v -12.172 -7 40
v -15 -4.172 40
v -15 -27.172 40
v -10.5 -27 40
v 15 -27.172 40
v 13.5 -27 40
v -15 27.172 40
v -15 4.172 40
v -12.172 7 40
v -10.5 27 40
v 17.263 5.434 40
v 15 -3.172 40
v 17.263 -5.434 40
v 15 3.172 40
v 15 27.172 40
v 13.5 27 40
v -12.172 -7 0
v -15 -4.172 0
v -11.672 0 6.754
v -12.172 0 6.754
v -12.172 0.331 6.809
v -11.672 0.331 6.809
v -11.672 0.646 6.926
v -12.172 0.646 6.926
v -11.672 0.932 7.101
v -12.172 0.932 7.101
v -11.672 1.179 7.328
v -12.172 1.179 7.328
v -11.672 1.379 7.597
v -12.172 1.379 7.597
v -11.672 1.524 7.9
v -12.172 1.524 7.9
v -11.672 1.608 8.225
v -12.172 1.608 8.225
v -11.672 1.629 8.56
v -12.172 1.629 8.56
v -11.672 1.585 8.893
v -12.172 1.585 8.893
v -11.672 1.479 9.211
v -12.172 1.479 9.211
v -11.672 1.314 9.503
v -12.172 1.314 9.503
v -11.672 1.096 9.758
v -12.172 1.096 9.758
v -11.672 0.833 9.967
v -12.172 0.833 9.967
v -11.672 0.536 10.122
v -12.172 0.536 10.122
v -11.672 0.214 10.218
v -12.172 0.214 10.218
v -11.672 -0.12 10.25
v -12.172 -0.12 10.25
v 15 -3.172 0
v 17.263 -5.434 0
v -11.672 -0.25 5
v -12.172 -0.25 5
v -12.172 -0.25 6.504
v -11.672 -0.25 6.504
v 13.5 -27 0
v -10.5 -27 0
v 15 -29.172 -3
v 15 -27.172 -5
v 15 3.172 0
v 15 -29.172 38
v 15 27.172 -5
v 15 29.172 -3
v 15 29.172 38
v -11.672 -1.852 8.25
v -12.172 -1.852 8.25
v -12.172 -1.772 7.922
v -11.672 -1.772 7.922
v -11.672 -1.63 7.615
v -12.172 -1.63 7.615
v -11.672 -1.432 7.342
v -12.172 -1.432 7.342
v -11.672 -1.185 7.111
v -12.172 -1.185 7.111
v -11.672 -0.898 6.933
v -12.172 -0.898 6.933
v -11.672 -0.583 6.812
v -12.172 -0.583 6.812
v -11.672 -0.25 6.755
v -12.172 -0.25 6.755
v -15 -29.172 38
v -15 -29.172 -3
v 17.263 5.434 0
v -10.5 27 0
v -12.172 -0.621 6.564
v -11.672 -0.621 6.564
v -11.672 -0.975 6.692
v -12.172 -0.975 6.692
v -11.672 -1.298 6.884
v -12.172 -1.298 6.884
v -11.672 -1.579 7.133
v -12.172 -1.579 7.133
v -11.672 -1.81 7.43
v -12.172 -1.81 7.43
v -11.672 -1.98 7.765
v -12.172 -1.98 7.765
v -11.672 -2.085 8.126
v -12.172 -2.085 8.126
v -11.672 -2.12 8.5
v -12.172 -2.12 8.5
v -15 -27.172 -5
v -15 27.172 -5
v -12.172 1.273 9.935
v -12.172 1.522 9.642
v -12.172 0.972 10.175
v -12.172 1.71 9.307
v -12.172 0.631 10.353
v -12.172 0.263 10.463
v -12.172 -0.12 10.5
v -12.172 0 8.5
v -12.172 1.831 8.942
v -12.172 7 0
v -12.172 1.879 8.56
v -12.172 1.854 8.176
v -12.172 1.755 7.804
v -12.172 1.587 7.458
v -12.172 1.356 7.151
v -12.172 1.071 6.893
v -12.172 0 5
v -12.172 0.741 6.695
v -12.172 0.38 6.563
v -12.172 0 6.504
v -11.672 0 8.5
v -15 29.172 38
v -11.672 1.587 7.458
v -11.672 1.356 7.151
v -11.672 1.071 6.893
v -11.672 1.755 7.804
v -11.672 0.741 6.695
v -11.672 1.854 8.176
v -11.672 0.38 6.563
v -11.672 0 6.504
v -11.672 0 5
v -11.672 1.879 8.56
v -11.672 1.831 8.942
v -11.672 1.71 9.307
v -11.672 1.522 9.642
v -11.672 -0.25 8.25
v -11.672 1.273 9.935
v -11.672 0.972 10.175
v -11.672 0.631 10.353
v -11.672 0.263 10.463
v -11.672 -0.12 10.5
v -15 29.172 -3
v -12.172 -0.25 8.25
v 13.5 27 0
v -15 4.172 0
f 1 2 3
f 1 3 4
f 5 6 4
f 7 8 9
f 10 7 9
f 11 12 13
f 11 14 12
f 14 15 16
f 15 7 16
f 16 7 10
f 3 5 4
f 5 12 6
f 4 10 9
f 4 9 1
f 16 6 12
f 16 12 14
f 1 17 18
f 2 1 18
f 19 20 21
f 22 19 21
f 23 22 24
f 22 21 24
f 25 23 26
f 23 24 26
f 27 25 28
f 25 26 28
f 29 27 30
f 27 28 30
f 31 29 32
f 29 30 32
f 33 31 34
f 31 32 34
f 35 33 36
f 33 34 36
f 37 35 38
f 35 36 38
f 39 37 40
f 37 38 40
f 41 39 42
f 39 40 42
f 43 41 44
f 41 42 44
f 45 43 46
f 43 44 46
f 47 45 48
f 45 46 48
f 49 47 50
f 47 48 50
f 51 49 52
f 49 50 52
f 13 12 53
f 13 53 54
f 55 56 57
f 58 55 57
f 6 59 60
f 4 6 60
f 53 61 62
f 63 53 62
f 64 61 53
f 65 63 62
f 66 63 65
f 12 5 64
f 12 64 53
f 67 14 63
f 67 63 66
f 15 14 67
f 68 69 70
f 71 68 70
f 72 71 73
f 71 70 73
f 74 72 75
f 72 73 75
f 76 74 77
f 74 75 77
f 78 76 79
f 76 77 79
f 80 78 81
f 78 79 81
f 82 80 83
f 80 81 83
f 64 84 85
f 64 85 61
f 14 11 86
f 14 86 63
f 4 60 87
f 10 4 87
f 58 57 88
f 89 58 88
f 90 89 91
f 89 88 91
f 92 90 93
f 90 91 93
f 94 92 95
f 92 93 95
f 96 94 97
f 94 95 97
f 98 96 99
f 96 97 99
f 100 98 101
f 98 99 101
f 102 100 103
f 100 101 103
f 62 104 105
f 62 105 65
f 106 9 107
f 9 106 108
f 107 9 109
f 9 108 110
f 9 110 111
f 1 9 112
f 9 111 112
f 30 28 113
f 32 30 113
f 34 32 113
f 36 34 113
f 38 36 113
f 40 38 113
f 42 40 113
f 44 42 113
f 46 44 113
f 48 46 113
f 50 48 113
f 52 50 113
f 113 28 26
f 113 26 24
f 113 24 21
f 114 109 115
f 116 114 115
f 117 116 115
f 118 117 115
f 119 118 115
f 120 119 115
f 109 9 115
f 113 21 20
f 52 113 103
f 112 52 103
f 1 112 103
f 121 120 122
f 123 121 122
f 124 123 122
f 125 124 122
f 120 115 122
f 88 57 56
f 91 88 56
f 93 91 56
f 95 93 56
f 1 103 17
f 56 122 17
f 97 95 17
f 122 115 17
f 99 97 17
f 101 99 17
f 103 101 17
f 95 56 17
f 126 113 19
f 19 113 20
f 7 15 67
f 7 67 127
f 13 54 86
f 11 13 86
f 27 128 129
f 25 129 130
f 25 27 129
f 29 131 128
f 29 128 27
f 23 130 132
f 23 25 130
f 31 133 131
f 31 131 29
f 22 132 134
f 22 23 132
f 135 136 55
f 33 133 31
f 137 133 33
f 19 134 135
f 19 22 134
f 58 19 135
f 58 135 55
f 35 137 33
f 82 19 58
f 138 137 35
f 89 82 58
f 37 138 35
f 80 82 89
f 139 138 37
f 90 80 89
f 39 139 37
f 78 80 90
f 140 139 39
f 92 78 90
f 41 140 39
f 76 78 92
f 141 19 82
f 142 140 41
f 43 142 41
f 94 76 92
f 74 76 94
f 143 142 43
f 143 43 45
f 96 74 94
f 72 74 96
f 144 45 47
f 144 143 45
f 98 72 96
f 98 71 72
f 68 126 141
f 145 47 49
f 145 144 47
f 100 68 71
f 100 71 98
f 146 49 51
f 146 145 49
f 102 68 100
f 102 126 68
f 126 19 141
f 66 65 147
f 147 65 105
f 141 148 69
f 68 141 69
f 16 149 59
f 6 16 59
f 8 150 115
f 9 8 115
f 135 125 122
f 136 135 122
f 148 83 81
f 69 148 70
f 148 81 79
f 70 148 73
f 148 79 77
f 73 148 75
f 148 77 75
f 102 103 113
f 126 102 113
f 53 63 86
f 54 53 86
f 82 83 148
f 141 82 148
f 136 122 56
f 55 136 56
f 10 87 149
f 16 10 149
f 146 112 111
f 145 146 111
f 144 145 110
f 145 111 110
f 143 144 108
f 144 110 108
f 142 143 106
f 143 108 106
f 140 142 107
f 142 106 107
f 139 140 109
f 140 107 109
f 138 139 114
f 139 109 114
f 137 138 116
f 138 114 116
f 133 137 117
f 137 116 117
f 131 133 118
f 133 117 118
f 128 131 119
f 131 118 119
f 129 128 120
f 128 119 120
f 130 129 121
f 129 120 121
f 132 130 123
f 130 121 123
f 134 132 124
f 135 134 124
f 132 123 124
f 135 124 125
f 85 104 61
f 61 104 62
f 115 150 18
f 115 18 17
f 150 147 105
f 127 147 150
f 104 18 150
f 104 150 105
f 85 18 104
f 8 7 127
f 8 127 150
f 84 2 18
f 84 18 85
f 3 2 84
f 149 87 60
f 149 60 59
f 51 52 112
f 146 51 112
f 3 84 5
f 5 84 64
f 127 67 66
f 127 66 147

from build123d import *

# Parameters (mm, degrees)
F1_DEPTH = 40
F0_W     = 0.5
F0_H     = 12
F0_W_2   = 11.5
F0_W_3   = 12
F0_H_2   = 0.5
F0_H_3   = 14.25
F2_DEPTH = 5
F3_SIZE  = 2
F5_DEPTH = 0.5


with BuildPart() as f1:
    # F0 (on Top) → F1 (new body)
    with BuildSketch(Plane.XY):
        Polygon((17.2627416998, 5.4343145751), (15, 3.1715728753), (15, -3.1715728753), (17.2627416998, -5.4343145751), (17.2627416998, -0.5656854249), (17.2627416998, 0.5656854249), align=None)
        Polygon((-15, 29.1715728753), (-15, 4.1715728753), (-12.1715728752, 7), (-12.1715728752, 0), (-12.1715728752, -7), (-15, -4.1715728753), (-15, -29.1715728753), (15, -29.1715728753), (15, -3.1715728753), (15, 3.1715728753), (15, 29.1715728753), align=None)
        Polygon((-10.4999961331, 14.999999851), (-10.4999961331, 26.999999851), (1.5000038669, 26.999999851), (2.0000038669, 26.999999851), (13.5000038669, 26.999999851), (13.5000038669, 14.999999851), (13.5000038669, 14.499999851), (13.5000038669, 0.249999851), (13.5000038669, -0.250000149), (13.5000038669, -14.500000149), (13.5000038669, -15.000000149), (13.5000038669, -27.000000149), (2.0000038669, -27.000000149), (1.5000038669, -27.000000149), (-10.4999961331, -27.000000149), (-10.4999961331, -15.000000149), (-10.4999961331, -14.500000149), (-10.4999961331, -0.250000149), (-10.4999961331, 0.249999851), (-10.4999961331, 14.499999851), align=None, mode=Mode.SUBTRACT)
    extrude(amount=F1_DEPTH)

    # F0 (on Top) → F2 (join)
    with BuildSketch(Plane.XY):
        Polygon((-15, 29.1715728753), (-15, 4.1715728753), (-12.1715728752, 7), (-12.1715728752, 0), (-12.1715728752, -7), (-15, -4.1715728753), (-15, -29.1715728753), (15, -29.1715728753), (15, -3.1715728753), (15, 3.1715728753), (15, 29.1715728753), align=None)
        Polygon((-10.4999961331, 14.999999851), (-10.4999961331, 26.999999851), (1.5000038669, 26.999999851), (2.0000038669, 26.999999851), (13.5000038669, 26.999999851), (13.5000038669, 14.999999851), (13.5000038669, 14.499999851), (13.5000038669, 0.249999851), (13.5000038669, -0.250000149), (13.5000038669, -14.500000149), (13.5000038669, -15.000000149), (13.5000038669, -27.000000149), (2.0000038669, -27.000000149), (1.5000038669, -27.000000149), (-10.4999961331, -27.000000149), (-10.4999961331, -15.000000149), (-10.4999961331, -14.500000149), (-10.4999961331, -0.250000149), (-10.4999961331, 0.249999851), (-10.4999961331, 14.499999851), align=None, mode=Mode.SUBTRACT)
        Polygon((-12.1715728752, 7), (-15, 4.1715728753), (-15, -4.1715728753), (-12.1715728752, -7), (-12.1715728752, 0), align=None)
        with Locations((1.7500038669, -21.000000149)):
            Rectangle(F0_W, F0_H)
        with Locations((7.7500038669, -21.000000149)):
            Rectangle(F0_W_2, F0_H)
        with Locations((-4.4999961331, -21.000000149)):
            Rectangle(F0_W_3, F0_H)
        with Locations((-4.4999961331, -14.750000149)):
            Rectangle(F0_W_3, F0_H_2)
        with Locations((1.7500038669, -14.750000149)):
            Rectangle(F0_W, F0_H_2)
        with Locations((1.7500038669, -7.375000149)):
            Rectangle(F0_W, F0_H_3)
        with Locations((-4.4999961331, -7.375000149)):
            Rectangle(F0_W_3, F0_H_3)
        with Locations((7.7500038669, -7.375000149)):
            Rectangle(F0_W_2, F0_H_3)
        with Locations((7.7500038669, 7.374999851)):
            Rectangle(F0_W_2, F0_H_3)
        with Locations((-4.4999961331, 7.374999851)):
            Rectangle(F0_W_3, F0_H_3)
        with Locations((1.7500038669, -1.49e-07)):
            Rectangle(F0_W, F0_H_2)
        with Locations((1.7500038669, 7.374999851)):
            Rectangle(F0_W, F0_H_3)
        with Locations((7.7500038669, 14.749999851)):
            Rectangle(F0_W_2, F0_H_2)
        with Locations((1.7500038669, 14.749999851)):
            Rectangle(F0_W, F0_H_2)
        with Locations((-4.4999961331, 14.749999851)):
            Rectangle(F0_W_3, F0_H_2)
        with Locations((-4.4999961331, 20.999999851)):
            Rectangle(F0_W_3, F0_H)
        with Locations((7.7500038669, 20.999999851)):
            Rectangle(F0_W_2, F0_H)
        with Locations((1.7500038669, 20.999999851)):
            Rectangle(F0_W, F0_H)
        with Locations((-4.4999961331, -1.49e-07)):
            Rectangle(F0_W_3, F0_H_2)
        with Locations((7.7500038669, -1.49e-07)):
            Rectangle(F0_W_2, F0_H_2)
        with Locations((7.7500038669, -14.750000149)):
            Rectangle(F0_W_2, F0_H_2)
    extrude(amount=-F2_DEPTH)

    # F3
    f3_edges = [f1.edges().sort_by_distance(p)[0] for p in [
        (0, -29.171573, -5),
        (0, 29.171573, -5),
        (0, -29.171573, 40),
        (0, 29.171573, 40),
    ]]
    chamfer(f3_edges, length=F3_SIZE)

    # F4 (on face) → F5 (cut)
    with BuildSketch(Plane(origin=(-12.1715728752, 0, 0), x_dir=(0, -1, 0), z_dir=(-1, 0, 0))):
        with BuildLine():
            Line((0.12, 10.25), (0.12, 10.5))
            ThreePointArc((0.12, 10.5), (-1.8790989856, 8.5600270426), (0, 6.5036032458))
            Line((0, 6.5036032458), (0, 6.7541191335))
            ThreePointArc((0, 6.7541191335), (-1.6289699135, 8.5600353381), (0.12, 10.25))
        make_face()
        with BuildLine():
            Line((0, 8.5), (0, 6.7541191335))
            ThreePointArc((0, 6.7541191335), (0.1250128042, 6.7500071795), (0.25, 6.7548352513))
            Line((0.25, 6.7548352513), (0.25, 8.25))
            Line((0.25, 8.25), (1.8520508076, 8.25))
            ThreePointArc((1.8520508076, 8.25), (1.865506934, 8.3746782406), (1.87, 8.5))
            Line((1.87, 8.5), (0, 8.5))
        make_face()
        with BuildLine():
            Line((0.25, 6.7548352513), (0.25, 6.5042294721))
            ThreePointArc((0.25, 6.5042294721), (1.5794519519, 7.1325205669), (2.12, 8.5))
            Line((2.12, 8.5), (1.87, 8.5))
            ThreePointArc((1.87, 8.5), (1.865506934, 8.3746782406), (1.8520508076, 8.25))
            ThreePointArc((1.8520508076, 8.25), (1.3140216535, 7.2206203491), (0.25, 6.7548352513))
        make_face()
        with BuildLine():
            Line((0, 6.7541191335), (0, 6.5036032458))
            ThreePointArc((0, 6.5036032458), (0.1250097944, 6.5000062745), (0.25, 6.5042294721))
            Line((0.25, 6.5042294721), (0.25, 6.7548352513))
            ThreePointArc((0.25, 6.7548352513), (0.1250128042, 6.7500071795), (0, 6.7541191335))
        make_face()
        with BuildLine():
            ThreePointArc((0.25, 6.5042294721), (0.1250097944, 6.5000062745), (0, 6.5036032458))
            Line((0, 6.5036032458), (0, 5))
            Line((0, 5), (0.25, 5))
            Line((0.25, 5), (0.25, 6.5042294721))
        make_face()
    extrude(amount=-F5_DEPTH, mode=Mode.SUBTRACT)


solid = f1.part
